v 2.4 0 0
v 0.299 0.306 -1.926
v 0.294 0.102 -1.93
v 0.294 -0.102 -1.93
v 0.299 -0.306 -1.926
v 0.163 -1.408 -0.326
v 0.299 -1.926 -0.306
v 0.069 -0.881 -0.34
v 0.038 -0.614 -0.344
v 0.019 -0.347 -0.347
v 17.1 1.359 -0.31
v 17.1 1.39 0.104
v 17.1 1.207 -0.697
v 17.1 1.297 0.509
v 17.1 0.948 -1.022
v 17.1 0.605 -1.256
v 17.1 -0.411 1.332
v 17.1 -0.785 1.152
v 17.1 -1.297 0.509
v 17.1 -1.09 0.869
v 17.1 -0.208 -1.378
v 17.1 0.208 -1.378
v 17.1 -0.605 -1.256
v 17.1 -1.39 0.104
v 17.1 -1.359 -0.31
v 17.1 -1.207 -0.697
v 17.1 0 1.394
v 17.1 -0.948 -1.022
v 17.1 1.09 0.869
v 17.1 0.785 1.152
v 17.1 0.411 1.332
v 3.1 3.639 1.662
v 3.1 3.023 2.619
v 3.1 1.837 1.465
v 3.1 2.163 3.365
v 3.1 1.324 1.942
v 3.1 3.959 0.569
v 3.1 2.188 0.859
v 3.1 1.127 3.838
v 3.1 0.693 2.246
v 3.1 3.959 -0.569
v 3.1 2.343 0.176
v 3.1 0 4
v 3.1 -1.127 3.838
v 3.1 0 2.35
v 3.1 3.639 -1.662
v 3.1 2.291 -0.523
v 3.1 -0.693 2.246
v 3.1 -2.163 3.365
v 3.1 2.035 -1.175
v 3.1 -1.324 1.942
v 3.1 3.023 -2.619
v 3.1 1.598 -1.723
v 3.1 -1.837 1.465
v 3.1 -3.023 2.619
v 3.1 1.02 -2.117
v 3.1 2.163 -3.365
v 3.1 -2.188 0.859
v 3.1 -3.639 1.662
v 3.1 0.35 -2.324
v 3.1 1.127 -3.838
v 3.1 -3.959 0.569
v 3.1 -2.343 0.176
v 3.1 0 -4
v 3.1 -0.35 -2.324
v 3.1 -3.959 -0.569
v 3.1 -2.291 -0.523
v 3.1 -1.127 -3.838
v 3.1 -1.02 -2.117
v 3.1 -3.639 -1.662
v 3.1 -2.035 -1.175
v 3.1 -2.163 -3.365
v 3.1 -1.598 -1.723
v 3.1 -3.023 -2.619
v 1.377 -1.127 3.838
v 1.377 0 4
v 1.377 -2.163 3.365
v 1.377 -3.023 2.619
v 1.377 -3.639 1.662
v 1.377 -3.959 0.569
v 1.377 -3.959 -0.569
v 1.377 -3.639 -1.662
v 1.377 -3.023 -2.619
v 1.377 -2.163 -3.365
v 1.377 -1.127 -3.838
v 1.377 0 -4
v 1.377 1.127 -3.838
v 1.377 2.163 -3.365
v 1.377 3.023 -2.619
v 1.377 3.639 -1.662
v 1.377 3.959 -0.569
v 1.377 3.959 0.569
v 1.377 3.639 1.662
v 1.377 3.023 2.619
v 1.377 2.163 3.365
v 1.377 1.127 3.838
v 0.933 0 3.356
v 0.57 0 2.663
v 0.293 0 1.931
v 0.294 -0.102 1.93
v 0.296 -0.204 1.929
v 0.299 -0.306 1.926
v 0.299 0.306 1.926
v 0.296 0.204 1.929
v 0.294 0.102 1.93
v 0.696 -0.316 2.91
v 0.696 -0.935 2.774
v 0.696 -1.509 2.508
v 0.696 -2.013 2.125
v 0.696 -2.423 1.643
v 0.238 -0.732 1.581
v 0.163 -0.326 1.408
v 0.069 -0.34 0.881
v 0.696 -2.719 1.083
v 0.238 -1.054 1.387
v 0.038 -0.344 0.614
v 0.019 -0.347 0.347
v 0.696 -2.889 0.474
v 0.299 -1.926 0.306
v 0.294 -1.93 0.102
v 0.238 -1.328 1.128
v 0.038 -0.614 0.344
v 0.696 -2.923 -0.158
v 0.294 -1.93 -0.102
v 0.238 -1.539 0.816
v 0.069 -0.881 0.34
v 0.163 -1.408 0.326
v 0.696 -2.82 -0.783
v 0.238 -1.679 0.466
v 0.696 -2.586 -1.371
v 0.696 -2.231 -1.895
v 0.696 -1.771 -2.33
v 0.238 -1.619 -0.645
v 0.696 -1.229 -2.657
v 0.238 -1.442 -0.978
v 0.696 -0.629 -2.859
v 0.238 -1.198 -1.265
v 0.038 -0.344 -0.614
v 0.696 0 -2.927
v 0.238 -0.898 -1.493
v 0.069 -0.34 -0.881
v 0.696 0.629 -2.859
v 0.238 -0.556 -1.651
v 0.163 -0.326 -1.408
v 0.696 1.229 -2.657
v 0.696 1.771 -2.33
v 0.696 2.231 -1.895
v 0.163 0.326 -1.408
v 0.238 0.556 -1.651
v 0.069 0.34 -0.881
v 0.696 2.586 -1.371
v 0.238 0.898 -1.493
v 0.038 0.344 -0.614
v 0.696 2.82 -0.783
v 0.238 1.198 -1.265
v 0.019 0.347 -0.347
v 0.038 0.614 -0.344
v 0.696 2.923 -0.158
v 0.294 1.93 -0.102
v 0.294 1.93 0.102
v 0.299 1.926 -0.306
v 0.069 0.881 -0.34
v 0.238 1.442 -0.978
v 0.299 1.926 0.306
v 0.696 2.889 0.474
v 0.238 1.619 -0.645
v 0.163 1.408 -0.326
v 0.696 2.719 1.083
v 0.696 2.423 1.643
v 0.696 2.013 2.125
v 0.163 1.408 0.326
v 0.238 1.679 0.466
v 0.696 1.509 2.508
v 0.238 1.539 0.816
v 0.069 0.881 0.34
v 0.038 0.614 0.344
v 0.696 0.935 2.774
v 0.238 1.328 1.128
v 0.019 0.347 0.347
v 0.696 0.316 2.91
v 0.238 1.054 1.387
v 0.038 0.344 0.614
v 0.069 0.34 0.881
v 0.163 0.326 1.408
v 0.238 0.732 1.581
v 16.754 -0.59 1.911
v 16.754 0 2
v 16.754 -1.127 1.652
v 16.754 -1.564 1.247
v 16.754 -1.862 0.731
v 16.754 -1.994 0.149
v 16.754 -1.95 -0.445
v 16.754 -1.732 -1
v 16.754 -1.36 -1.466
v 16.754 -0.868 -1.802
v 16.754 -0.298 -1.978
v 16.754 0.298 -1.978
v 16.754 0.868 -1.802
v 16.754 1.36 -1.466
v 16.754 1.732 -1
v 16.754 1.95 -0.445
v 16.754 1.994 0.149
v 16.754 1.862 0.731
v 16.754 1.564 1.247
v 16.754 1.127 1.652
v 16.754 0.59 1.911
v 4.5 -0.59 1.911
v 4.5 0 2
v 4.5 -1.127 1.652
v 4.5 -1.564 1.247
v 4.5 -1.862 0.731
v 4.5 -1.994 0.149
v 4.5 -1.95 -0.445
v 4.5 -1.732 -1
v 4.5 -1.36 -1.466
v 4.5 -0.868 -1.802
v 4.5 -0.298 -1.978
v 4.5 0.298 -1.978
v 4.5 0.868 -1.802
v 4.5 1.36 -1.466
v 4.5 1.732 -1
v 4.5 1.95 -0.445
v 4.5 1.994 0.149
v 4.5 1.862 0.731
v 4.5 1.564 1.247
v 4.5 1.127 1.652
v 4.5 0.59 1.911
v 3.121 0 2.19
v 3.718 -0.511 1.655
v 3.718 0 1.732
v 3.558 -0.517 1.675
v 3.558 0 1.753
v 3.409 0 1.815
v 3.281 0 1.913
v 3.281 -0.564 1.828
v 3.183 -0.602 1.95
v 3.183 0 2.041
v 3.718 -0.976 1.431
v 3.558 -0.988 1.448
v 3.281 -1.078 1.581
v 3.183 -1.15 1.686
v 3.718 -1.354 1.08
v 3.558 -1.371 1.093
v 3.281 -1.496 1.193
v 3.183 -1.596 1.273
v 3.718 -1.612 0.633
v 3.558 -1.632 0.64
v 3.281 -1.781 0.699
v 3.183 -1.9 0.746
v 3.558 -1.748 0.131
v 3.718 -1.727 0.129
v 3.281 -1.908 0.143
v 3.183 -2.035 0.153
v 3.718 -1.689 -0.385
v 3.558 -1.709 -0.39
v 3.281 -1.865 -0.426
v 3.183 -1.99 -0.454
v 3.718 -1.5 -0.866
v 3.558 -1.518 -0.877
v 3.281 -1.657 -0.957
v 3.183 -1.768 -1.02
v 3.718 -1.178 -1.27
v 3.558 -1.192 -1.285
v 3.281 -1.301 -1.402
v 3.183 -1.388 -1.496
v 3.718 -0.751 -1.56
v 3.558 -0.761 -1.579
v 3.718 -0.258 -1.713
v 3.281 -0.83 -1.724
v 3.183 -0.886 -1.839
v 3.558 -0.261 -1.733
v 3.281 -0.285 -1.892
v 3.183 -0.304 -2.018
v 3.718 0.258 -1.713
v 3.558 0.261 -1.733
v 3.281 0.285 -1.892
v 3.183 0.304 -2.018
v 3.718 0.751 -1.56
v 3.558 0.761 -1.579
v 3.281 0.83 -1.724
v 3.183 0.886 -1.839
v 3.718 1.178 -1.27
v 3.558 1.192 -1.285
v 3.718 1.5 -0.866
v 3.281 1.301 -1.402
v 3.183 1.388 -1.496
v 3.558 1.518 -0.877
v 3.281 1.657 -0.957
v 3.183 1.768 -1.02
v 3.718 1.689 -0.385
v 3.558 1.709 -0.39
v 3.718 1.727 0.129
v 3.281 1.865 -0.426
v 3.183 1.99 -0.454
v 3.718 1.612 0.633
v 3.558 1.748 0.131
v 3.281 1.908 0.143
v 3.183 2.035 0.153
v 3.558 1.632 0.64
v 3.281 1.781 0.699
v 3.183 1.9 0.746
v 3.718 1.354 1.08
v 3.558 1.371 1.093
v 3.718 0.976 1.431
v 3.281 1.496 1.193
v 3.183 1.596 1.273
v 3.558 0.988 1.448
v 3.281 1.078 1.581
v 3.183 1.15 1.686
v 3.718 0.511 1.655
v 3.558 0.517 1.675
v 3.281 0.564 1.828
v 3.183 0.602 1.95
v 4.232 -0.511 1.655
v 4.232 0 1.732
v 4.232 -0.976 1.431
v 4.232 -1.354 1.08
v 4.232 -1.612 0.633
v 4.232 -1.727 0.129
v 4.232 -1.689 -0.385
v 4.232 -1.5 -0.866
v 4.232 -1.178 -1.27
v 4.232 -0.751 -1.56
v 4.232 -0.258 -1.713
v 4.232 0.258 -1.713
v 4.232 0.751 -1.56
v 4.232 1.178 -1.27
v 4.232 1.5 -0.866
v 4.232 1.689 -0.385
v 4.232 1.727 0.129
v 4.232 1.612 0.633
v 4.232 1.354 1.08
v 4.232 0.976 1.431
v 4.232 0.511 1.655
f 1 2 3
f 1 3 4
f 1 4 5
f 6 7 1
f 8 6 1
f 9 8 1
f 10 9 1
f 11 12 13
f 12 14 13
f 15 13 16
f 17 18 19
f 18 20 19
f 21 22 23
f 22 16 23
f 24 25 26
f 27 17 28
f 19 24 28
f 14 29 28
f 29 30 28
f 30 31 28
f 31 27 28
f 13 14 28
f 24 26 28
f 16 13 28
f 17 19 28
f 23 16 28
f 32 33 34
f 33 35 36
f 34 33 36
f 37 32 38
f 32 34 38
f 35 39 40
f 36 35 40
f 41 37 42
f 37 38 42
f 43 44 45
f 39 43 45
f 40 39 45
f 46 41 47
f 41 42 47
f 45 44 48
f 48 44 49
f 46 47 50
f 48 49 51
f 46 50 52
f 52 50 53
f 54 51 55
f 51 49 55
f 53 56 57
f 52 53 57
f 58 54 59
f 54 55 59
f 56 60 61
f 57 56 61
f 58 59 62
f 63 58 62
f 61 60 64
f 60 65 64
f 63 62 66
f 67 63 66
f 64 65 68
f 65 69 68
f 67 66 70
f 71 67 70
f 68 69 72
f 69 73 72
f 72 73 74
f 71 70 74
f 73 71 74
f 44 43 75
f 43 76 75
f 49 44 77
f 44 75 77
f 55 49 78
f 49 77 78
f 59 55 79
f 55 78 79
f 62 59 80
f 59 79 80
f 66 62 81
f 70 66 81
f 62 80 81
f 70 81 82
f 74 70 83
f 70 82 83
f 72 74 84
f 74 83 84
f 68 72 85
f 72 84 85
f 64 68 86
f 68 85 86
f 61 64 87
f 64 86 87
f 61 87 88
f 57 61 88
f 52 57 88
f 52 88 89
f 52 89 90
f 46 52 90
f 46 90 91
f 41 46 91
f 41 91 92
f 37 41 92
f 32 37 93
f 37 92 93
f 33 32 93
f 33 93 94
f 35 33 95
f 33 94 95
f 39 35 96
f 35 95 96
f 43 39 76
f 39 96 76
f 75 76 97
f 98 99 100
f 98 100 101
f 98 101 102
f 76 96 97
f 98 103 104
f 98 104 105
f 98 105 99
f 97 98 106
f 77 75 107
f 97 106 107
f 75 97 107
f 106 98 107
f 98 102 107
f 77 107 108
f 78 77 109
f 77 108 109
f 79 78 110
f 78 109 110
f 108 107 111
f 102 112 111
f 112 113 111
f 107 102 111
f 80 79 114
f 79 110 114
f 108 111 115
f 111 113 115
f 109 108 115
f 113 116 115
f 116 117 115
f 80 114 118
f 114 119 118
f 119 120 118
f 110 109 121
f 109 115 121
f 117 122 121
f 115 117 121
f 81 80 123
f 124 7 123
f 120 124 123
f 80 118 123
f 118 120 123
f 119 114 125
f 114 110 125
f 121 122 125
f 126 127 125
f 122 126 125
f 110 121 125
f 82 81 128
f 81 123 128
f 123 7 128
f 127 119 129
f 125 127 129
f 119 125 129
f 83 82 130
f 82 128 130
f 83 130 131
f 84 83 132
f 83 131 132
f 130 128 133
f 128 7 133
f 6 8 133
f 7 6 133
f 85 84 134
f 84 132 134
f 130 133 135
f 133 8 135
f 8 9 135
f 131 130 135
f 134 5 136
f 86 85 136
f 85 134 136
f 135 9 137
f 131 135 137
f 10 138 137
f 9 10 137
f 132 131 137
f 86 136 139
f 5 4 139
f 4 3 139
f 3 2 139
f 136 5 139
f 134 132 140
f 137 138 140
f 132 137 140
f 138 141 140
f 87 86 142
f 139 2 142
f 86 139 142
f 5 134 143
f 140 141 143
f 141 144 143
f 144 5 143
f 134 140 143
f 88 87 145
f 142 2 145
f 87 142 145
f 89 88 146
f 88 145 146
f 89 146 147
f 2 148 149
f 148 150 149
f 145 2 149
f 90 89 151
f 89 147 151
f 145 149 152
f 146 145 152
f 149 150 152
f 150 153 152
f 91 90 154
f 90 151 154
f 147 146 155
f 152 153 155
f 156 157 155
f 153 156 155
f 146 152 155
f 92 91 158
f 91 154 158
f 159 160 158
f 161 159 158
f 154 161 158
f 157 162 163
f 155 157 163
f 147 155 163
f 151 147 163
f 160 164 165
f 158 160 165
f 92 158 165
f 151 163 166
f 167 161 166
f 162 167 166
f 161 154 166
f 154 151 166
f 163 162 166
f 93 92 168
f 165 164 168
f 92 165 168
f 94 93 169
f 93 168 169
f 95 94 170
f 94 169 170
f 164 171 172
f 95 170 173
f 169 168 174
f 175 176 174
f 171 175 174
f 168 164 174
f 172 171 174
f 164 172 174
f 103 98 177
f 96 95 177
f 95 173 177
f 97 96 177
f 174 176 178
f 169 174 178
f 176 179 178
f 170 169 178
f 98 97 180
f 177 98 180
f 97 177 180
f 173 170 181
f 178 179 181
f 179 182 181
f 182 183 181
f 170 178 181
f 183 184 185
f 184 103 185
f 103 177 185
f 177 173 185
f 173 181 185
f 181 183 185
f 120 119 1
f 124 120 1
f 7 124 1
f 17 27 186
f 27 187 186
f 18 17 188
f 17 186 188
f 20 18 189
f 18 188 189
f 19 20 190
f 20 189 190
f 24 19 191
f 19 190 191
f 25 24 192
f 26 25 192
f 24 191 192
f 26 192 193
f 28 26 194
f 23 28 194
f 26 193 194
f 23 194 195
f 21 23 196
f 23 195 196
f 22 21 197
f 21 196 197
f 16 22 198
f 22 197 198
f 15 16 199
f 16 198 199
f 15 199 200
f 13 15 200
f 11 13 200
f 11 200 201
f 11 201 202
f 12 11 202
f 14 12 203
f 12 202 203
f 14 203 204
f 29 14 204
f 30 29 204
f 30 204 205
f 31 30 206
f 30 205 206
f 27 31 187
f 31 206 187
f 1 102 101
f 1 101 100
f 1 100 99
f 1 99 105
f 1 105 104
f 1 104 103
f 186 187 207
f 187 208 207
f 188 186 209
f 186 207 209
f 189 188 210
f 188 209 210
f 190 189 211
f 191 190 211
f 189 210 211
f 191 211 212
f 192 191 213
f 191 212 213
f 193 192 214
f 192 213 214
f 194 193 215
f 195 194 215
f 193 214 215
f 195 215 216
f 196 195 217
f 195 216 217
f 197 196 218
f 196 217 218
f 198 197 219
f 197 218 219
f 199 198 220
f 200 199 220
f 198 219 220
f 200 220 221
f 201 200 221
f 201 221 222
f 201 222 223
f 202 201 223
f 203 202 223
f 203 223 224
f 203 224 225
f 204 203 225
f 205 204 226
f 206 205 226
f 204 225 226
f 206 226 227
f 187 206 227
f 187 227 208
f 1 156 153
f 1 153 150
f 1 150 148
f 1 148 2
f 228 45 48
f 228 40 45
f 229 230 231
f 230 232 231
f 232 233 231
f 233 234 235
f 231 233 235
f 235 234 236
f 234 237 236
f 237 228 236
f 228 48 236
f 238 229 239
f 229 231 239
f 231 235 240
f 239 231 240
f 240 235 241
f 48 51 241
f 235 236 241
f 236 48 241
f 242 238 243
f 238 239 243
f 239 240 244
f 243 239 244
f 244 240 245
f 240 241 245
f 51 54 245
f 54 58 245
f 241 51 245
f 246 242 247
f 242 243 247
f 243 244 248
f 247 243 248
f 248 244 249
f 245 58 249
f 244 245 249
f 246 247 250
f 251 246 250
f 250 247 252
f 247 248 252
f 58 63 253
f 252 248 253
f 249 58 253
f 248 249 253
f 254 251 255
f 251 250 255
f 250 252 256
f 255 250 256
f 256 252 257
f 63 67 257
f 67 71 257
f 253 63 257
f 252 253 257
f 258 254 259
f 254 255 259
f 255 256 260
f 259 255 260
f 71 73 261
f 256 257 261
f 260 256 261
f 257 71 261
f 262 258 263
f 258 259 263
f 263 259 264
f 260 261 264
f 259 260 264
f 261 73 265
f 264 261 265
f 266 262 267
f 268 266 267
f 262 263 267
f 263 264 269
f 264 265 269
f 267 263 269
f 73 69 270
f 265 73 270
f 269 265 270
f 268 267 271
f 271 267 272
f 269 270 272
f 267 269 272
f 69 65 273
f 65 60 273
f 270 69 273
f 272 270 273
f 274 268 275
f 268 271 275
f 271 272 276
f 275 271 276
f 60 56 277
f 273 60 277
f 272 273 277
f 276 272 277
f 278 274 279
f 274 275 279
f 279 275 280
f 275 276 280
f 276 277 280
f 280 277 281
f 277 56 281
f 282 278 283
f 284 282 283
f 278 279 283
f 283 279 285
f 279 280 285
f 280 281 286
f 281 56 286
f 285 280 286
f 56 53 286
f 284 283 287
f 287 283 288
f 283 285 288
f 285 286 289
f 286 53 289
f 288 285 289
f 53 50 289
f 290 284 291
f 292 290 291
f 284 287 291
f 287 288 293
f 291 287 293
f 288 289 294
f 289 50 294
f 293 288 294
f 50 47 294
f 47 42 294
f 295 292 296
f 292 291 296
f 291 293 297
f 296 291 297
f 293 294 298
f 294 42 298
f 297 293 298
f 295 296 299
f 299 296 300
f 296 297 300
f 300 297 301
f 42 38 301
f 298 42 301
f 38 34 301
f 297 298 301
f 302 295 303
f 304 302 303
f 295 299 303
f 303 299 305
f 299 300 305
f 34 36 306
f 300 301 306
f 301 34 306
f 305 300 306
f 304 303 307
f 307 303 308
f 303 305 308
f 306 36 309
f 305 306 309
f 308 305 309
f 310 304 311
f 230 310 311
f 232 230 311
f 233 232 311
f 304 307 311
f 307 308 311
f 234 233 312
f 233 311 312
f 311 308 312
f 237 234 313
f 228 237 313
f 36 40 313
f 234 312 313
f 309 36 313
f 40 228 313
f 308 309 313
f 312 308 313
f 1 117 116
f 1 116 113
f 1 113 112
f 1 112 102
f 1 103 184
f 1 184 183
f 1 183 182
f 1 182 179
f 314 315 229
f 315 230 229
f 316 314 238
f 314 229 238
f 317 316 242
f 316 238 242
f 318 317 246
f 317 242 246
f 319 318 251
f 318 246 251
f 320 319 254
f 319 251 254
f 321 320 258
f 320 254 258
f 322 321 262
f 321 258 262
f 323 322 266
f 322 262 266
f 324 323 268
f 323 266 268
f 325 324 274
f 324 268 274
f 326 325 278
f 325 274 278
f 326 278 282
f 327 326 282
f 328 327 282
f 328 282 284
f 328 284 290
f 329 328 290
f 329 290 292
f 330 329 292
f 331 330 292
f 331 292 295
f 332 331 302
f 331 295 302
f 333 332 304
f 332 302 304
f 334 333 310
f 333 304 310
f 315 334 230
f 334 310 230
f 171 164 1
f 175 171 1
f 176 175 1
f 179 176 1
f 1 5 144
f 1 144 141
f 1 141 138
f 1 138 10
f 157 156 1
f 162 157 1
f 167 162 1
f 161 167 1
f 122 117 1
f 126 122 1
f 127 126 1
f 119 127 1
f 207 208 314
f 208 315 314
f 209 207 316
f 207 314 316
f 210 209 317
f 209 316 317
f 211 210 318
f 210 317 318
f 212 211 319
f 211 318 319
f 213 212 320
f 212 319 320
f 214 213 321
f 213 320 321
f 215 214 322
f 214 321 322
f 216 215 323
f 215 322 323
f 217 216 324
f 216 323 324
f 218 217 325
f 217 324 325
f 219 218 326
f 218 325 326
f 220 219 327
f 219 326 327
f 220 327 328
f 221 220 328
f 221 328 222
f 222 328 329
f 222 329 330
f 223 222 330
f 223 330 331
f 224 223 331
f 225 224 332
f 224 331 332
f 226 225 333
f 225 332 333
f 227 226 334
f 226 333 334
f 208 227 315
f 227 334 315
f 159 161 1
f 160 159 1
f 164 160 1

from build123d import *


with BuildPart() as part:
    # 草图2 → Revolve 706 (revolve)
    with BuildSketch(Plane.XY, mode=Mode.PRIVATE) as revolve_706_sk:
        with BuildLine():
            Line((0, 0), (17.1, 0))
            Line((17.1, 0), (17.1, 2))
            Line((17.1, 2), (4.5, 2))
            Line((4.5, 2), (4.232, 1.732))
            Line((4.232, 1.732), (3.718, 1.732))
            ThreePointArc((3.718, 1.732), (3.281008009, 1.913008009), (3.1, 2.35))
            Line((3.1, 2.35), (3.1, 4))
            Line((3.1, 4), (1.376524617, 4))
            ThreePointArc((1.376524617, 4), (0.353757652, 2.115113473), (0, 0))
        make_face()
    revolve(revolve_706_sk.sketch.rotate(Axis((-1.331757704, 0, 0), (1, 0, 0)), 90), axis=Axis((-1.331757704, 0, 0), (1, 0, 0)))

    # 草图3 → 切除-旋转1 (revolve, cut)
    with BuildSketch(Plane.XY, mode=Mode.PRIVATE) as cut_revolve_1_sk:
        Polygon((16.753791204, 2), (17.453791204, 2), (17.1, 1.3938), align=None)
    revolve(cut_revolve_1_sk.sketch.rotate(Axis((-0.242766179, 0, 0), (1, 0, 0)), 90), axis=Axis((-0.242766179, 0, 0), (1, 0, 0)), mode=Mode.SUBTRACT)

    # 草图5 → 切除-放样1 section 0
    with BuildSketch(Plane(origin=(0, 0, 0), x_dir=(0, 0, -1), z_dir=(1, 0, 0)), mode=Mode.PRIVATE) as loft_1_s0:
        with BuildLine():
            Line((0.35, 2.2), (-0.35, 2.2))
            Line((-0.35, 2.2), (-0.35, -2.2))
            Line((-0.35, -2.2), (0.35, -2.2))
            Line((0.35, -2.2), (0.35, 2.2))
        make_face()
    loft_1 = loft([Vertex(2.4, 0, 0), loft_1_s0.sketch], mode=Mode.SUBTRACT)

    # 镜向1: 切除-放样1 across plane
    add(loft_1.mirror(Plane(origin=(0, 0, 0), x_dir=(0, 0.7071067811865462, 0.7071067811865488), z_dir=(0, -0.7071067811865488, 0.7071067811865462))), mode=Mode.SUBTRACT)


solid = part.part
